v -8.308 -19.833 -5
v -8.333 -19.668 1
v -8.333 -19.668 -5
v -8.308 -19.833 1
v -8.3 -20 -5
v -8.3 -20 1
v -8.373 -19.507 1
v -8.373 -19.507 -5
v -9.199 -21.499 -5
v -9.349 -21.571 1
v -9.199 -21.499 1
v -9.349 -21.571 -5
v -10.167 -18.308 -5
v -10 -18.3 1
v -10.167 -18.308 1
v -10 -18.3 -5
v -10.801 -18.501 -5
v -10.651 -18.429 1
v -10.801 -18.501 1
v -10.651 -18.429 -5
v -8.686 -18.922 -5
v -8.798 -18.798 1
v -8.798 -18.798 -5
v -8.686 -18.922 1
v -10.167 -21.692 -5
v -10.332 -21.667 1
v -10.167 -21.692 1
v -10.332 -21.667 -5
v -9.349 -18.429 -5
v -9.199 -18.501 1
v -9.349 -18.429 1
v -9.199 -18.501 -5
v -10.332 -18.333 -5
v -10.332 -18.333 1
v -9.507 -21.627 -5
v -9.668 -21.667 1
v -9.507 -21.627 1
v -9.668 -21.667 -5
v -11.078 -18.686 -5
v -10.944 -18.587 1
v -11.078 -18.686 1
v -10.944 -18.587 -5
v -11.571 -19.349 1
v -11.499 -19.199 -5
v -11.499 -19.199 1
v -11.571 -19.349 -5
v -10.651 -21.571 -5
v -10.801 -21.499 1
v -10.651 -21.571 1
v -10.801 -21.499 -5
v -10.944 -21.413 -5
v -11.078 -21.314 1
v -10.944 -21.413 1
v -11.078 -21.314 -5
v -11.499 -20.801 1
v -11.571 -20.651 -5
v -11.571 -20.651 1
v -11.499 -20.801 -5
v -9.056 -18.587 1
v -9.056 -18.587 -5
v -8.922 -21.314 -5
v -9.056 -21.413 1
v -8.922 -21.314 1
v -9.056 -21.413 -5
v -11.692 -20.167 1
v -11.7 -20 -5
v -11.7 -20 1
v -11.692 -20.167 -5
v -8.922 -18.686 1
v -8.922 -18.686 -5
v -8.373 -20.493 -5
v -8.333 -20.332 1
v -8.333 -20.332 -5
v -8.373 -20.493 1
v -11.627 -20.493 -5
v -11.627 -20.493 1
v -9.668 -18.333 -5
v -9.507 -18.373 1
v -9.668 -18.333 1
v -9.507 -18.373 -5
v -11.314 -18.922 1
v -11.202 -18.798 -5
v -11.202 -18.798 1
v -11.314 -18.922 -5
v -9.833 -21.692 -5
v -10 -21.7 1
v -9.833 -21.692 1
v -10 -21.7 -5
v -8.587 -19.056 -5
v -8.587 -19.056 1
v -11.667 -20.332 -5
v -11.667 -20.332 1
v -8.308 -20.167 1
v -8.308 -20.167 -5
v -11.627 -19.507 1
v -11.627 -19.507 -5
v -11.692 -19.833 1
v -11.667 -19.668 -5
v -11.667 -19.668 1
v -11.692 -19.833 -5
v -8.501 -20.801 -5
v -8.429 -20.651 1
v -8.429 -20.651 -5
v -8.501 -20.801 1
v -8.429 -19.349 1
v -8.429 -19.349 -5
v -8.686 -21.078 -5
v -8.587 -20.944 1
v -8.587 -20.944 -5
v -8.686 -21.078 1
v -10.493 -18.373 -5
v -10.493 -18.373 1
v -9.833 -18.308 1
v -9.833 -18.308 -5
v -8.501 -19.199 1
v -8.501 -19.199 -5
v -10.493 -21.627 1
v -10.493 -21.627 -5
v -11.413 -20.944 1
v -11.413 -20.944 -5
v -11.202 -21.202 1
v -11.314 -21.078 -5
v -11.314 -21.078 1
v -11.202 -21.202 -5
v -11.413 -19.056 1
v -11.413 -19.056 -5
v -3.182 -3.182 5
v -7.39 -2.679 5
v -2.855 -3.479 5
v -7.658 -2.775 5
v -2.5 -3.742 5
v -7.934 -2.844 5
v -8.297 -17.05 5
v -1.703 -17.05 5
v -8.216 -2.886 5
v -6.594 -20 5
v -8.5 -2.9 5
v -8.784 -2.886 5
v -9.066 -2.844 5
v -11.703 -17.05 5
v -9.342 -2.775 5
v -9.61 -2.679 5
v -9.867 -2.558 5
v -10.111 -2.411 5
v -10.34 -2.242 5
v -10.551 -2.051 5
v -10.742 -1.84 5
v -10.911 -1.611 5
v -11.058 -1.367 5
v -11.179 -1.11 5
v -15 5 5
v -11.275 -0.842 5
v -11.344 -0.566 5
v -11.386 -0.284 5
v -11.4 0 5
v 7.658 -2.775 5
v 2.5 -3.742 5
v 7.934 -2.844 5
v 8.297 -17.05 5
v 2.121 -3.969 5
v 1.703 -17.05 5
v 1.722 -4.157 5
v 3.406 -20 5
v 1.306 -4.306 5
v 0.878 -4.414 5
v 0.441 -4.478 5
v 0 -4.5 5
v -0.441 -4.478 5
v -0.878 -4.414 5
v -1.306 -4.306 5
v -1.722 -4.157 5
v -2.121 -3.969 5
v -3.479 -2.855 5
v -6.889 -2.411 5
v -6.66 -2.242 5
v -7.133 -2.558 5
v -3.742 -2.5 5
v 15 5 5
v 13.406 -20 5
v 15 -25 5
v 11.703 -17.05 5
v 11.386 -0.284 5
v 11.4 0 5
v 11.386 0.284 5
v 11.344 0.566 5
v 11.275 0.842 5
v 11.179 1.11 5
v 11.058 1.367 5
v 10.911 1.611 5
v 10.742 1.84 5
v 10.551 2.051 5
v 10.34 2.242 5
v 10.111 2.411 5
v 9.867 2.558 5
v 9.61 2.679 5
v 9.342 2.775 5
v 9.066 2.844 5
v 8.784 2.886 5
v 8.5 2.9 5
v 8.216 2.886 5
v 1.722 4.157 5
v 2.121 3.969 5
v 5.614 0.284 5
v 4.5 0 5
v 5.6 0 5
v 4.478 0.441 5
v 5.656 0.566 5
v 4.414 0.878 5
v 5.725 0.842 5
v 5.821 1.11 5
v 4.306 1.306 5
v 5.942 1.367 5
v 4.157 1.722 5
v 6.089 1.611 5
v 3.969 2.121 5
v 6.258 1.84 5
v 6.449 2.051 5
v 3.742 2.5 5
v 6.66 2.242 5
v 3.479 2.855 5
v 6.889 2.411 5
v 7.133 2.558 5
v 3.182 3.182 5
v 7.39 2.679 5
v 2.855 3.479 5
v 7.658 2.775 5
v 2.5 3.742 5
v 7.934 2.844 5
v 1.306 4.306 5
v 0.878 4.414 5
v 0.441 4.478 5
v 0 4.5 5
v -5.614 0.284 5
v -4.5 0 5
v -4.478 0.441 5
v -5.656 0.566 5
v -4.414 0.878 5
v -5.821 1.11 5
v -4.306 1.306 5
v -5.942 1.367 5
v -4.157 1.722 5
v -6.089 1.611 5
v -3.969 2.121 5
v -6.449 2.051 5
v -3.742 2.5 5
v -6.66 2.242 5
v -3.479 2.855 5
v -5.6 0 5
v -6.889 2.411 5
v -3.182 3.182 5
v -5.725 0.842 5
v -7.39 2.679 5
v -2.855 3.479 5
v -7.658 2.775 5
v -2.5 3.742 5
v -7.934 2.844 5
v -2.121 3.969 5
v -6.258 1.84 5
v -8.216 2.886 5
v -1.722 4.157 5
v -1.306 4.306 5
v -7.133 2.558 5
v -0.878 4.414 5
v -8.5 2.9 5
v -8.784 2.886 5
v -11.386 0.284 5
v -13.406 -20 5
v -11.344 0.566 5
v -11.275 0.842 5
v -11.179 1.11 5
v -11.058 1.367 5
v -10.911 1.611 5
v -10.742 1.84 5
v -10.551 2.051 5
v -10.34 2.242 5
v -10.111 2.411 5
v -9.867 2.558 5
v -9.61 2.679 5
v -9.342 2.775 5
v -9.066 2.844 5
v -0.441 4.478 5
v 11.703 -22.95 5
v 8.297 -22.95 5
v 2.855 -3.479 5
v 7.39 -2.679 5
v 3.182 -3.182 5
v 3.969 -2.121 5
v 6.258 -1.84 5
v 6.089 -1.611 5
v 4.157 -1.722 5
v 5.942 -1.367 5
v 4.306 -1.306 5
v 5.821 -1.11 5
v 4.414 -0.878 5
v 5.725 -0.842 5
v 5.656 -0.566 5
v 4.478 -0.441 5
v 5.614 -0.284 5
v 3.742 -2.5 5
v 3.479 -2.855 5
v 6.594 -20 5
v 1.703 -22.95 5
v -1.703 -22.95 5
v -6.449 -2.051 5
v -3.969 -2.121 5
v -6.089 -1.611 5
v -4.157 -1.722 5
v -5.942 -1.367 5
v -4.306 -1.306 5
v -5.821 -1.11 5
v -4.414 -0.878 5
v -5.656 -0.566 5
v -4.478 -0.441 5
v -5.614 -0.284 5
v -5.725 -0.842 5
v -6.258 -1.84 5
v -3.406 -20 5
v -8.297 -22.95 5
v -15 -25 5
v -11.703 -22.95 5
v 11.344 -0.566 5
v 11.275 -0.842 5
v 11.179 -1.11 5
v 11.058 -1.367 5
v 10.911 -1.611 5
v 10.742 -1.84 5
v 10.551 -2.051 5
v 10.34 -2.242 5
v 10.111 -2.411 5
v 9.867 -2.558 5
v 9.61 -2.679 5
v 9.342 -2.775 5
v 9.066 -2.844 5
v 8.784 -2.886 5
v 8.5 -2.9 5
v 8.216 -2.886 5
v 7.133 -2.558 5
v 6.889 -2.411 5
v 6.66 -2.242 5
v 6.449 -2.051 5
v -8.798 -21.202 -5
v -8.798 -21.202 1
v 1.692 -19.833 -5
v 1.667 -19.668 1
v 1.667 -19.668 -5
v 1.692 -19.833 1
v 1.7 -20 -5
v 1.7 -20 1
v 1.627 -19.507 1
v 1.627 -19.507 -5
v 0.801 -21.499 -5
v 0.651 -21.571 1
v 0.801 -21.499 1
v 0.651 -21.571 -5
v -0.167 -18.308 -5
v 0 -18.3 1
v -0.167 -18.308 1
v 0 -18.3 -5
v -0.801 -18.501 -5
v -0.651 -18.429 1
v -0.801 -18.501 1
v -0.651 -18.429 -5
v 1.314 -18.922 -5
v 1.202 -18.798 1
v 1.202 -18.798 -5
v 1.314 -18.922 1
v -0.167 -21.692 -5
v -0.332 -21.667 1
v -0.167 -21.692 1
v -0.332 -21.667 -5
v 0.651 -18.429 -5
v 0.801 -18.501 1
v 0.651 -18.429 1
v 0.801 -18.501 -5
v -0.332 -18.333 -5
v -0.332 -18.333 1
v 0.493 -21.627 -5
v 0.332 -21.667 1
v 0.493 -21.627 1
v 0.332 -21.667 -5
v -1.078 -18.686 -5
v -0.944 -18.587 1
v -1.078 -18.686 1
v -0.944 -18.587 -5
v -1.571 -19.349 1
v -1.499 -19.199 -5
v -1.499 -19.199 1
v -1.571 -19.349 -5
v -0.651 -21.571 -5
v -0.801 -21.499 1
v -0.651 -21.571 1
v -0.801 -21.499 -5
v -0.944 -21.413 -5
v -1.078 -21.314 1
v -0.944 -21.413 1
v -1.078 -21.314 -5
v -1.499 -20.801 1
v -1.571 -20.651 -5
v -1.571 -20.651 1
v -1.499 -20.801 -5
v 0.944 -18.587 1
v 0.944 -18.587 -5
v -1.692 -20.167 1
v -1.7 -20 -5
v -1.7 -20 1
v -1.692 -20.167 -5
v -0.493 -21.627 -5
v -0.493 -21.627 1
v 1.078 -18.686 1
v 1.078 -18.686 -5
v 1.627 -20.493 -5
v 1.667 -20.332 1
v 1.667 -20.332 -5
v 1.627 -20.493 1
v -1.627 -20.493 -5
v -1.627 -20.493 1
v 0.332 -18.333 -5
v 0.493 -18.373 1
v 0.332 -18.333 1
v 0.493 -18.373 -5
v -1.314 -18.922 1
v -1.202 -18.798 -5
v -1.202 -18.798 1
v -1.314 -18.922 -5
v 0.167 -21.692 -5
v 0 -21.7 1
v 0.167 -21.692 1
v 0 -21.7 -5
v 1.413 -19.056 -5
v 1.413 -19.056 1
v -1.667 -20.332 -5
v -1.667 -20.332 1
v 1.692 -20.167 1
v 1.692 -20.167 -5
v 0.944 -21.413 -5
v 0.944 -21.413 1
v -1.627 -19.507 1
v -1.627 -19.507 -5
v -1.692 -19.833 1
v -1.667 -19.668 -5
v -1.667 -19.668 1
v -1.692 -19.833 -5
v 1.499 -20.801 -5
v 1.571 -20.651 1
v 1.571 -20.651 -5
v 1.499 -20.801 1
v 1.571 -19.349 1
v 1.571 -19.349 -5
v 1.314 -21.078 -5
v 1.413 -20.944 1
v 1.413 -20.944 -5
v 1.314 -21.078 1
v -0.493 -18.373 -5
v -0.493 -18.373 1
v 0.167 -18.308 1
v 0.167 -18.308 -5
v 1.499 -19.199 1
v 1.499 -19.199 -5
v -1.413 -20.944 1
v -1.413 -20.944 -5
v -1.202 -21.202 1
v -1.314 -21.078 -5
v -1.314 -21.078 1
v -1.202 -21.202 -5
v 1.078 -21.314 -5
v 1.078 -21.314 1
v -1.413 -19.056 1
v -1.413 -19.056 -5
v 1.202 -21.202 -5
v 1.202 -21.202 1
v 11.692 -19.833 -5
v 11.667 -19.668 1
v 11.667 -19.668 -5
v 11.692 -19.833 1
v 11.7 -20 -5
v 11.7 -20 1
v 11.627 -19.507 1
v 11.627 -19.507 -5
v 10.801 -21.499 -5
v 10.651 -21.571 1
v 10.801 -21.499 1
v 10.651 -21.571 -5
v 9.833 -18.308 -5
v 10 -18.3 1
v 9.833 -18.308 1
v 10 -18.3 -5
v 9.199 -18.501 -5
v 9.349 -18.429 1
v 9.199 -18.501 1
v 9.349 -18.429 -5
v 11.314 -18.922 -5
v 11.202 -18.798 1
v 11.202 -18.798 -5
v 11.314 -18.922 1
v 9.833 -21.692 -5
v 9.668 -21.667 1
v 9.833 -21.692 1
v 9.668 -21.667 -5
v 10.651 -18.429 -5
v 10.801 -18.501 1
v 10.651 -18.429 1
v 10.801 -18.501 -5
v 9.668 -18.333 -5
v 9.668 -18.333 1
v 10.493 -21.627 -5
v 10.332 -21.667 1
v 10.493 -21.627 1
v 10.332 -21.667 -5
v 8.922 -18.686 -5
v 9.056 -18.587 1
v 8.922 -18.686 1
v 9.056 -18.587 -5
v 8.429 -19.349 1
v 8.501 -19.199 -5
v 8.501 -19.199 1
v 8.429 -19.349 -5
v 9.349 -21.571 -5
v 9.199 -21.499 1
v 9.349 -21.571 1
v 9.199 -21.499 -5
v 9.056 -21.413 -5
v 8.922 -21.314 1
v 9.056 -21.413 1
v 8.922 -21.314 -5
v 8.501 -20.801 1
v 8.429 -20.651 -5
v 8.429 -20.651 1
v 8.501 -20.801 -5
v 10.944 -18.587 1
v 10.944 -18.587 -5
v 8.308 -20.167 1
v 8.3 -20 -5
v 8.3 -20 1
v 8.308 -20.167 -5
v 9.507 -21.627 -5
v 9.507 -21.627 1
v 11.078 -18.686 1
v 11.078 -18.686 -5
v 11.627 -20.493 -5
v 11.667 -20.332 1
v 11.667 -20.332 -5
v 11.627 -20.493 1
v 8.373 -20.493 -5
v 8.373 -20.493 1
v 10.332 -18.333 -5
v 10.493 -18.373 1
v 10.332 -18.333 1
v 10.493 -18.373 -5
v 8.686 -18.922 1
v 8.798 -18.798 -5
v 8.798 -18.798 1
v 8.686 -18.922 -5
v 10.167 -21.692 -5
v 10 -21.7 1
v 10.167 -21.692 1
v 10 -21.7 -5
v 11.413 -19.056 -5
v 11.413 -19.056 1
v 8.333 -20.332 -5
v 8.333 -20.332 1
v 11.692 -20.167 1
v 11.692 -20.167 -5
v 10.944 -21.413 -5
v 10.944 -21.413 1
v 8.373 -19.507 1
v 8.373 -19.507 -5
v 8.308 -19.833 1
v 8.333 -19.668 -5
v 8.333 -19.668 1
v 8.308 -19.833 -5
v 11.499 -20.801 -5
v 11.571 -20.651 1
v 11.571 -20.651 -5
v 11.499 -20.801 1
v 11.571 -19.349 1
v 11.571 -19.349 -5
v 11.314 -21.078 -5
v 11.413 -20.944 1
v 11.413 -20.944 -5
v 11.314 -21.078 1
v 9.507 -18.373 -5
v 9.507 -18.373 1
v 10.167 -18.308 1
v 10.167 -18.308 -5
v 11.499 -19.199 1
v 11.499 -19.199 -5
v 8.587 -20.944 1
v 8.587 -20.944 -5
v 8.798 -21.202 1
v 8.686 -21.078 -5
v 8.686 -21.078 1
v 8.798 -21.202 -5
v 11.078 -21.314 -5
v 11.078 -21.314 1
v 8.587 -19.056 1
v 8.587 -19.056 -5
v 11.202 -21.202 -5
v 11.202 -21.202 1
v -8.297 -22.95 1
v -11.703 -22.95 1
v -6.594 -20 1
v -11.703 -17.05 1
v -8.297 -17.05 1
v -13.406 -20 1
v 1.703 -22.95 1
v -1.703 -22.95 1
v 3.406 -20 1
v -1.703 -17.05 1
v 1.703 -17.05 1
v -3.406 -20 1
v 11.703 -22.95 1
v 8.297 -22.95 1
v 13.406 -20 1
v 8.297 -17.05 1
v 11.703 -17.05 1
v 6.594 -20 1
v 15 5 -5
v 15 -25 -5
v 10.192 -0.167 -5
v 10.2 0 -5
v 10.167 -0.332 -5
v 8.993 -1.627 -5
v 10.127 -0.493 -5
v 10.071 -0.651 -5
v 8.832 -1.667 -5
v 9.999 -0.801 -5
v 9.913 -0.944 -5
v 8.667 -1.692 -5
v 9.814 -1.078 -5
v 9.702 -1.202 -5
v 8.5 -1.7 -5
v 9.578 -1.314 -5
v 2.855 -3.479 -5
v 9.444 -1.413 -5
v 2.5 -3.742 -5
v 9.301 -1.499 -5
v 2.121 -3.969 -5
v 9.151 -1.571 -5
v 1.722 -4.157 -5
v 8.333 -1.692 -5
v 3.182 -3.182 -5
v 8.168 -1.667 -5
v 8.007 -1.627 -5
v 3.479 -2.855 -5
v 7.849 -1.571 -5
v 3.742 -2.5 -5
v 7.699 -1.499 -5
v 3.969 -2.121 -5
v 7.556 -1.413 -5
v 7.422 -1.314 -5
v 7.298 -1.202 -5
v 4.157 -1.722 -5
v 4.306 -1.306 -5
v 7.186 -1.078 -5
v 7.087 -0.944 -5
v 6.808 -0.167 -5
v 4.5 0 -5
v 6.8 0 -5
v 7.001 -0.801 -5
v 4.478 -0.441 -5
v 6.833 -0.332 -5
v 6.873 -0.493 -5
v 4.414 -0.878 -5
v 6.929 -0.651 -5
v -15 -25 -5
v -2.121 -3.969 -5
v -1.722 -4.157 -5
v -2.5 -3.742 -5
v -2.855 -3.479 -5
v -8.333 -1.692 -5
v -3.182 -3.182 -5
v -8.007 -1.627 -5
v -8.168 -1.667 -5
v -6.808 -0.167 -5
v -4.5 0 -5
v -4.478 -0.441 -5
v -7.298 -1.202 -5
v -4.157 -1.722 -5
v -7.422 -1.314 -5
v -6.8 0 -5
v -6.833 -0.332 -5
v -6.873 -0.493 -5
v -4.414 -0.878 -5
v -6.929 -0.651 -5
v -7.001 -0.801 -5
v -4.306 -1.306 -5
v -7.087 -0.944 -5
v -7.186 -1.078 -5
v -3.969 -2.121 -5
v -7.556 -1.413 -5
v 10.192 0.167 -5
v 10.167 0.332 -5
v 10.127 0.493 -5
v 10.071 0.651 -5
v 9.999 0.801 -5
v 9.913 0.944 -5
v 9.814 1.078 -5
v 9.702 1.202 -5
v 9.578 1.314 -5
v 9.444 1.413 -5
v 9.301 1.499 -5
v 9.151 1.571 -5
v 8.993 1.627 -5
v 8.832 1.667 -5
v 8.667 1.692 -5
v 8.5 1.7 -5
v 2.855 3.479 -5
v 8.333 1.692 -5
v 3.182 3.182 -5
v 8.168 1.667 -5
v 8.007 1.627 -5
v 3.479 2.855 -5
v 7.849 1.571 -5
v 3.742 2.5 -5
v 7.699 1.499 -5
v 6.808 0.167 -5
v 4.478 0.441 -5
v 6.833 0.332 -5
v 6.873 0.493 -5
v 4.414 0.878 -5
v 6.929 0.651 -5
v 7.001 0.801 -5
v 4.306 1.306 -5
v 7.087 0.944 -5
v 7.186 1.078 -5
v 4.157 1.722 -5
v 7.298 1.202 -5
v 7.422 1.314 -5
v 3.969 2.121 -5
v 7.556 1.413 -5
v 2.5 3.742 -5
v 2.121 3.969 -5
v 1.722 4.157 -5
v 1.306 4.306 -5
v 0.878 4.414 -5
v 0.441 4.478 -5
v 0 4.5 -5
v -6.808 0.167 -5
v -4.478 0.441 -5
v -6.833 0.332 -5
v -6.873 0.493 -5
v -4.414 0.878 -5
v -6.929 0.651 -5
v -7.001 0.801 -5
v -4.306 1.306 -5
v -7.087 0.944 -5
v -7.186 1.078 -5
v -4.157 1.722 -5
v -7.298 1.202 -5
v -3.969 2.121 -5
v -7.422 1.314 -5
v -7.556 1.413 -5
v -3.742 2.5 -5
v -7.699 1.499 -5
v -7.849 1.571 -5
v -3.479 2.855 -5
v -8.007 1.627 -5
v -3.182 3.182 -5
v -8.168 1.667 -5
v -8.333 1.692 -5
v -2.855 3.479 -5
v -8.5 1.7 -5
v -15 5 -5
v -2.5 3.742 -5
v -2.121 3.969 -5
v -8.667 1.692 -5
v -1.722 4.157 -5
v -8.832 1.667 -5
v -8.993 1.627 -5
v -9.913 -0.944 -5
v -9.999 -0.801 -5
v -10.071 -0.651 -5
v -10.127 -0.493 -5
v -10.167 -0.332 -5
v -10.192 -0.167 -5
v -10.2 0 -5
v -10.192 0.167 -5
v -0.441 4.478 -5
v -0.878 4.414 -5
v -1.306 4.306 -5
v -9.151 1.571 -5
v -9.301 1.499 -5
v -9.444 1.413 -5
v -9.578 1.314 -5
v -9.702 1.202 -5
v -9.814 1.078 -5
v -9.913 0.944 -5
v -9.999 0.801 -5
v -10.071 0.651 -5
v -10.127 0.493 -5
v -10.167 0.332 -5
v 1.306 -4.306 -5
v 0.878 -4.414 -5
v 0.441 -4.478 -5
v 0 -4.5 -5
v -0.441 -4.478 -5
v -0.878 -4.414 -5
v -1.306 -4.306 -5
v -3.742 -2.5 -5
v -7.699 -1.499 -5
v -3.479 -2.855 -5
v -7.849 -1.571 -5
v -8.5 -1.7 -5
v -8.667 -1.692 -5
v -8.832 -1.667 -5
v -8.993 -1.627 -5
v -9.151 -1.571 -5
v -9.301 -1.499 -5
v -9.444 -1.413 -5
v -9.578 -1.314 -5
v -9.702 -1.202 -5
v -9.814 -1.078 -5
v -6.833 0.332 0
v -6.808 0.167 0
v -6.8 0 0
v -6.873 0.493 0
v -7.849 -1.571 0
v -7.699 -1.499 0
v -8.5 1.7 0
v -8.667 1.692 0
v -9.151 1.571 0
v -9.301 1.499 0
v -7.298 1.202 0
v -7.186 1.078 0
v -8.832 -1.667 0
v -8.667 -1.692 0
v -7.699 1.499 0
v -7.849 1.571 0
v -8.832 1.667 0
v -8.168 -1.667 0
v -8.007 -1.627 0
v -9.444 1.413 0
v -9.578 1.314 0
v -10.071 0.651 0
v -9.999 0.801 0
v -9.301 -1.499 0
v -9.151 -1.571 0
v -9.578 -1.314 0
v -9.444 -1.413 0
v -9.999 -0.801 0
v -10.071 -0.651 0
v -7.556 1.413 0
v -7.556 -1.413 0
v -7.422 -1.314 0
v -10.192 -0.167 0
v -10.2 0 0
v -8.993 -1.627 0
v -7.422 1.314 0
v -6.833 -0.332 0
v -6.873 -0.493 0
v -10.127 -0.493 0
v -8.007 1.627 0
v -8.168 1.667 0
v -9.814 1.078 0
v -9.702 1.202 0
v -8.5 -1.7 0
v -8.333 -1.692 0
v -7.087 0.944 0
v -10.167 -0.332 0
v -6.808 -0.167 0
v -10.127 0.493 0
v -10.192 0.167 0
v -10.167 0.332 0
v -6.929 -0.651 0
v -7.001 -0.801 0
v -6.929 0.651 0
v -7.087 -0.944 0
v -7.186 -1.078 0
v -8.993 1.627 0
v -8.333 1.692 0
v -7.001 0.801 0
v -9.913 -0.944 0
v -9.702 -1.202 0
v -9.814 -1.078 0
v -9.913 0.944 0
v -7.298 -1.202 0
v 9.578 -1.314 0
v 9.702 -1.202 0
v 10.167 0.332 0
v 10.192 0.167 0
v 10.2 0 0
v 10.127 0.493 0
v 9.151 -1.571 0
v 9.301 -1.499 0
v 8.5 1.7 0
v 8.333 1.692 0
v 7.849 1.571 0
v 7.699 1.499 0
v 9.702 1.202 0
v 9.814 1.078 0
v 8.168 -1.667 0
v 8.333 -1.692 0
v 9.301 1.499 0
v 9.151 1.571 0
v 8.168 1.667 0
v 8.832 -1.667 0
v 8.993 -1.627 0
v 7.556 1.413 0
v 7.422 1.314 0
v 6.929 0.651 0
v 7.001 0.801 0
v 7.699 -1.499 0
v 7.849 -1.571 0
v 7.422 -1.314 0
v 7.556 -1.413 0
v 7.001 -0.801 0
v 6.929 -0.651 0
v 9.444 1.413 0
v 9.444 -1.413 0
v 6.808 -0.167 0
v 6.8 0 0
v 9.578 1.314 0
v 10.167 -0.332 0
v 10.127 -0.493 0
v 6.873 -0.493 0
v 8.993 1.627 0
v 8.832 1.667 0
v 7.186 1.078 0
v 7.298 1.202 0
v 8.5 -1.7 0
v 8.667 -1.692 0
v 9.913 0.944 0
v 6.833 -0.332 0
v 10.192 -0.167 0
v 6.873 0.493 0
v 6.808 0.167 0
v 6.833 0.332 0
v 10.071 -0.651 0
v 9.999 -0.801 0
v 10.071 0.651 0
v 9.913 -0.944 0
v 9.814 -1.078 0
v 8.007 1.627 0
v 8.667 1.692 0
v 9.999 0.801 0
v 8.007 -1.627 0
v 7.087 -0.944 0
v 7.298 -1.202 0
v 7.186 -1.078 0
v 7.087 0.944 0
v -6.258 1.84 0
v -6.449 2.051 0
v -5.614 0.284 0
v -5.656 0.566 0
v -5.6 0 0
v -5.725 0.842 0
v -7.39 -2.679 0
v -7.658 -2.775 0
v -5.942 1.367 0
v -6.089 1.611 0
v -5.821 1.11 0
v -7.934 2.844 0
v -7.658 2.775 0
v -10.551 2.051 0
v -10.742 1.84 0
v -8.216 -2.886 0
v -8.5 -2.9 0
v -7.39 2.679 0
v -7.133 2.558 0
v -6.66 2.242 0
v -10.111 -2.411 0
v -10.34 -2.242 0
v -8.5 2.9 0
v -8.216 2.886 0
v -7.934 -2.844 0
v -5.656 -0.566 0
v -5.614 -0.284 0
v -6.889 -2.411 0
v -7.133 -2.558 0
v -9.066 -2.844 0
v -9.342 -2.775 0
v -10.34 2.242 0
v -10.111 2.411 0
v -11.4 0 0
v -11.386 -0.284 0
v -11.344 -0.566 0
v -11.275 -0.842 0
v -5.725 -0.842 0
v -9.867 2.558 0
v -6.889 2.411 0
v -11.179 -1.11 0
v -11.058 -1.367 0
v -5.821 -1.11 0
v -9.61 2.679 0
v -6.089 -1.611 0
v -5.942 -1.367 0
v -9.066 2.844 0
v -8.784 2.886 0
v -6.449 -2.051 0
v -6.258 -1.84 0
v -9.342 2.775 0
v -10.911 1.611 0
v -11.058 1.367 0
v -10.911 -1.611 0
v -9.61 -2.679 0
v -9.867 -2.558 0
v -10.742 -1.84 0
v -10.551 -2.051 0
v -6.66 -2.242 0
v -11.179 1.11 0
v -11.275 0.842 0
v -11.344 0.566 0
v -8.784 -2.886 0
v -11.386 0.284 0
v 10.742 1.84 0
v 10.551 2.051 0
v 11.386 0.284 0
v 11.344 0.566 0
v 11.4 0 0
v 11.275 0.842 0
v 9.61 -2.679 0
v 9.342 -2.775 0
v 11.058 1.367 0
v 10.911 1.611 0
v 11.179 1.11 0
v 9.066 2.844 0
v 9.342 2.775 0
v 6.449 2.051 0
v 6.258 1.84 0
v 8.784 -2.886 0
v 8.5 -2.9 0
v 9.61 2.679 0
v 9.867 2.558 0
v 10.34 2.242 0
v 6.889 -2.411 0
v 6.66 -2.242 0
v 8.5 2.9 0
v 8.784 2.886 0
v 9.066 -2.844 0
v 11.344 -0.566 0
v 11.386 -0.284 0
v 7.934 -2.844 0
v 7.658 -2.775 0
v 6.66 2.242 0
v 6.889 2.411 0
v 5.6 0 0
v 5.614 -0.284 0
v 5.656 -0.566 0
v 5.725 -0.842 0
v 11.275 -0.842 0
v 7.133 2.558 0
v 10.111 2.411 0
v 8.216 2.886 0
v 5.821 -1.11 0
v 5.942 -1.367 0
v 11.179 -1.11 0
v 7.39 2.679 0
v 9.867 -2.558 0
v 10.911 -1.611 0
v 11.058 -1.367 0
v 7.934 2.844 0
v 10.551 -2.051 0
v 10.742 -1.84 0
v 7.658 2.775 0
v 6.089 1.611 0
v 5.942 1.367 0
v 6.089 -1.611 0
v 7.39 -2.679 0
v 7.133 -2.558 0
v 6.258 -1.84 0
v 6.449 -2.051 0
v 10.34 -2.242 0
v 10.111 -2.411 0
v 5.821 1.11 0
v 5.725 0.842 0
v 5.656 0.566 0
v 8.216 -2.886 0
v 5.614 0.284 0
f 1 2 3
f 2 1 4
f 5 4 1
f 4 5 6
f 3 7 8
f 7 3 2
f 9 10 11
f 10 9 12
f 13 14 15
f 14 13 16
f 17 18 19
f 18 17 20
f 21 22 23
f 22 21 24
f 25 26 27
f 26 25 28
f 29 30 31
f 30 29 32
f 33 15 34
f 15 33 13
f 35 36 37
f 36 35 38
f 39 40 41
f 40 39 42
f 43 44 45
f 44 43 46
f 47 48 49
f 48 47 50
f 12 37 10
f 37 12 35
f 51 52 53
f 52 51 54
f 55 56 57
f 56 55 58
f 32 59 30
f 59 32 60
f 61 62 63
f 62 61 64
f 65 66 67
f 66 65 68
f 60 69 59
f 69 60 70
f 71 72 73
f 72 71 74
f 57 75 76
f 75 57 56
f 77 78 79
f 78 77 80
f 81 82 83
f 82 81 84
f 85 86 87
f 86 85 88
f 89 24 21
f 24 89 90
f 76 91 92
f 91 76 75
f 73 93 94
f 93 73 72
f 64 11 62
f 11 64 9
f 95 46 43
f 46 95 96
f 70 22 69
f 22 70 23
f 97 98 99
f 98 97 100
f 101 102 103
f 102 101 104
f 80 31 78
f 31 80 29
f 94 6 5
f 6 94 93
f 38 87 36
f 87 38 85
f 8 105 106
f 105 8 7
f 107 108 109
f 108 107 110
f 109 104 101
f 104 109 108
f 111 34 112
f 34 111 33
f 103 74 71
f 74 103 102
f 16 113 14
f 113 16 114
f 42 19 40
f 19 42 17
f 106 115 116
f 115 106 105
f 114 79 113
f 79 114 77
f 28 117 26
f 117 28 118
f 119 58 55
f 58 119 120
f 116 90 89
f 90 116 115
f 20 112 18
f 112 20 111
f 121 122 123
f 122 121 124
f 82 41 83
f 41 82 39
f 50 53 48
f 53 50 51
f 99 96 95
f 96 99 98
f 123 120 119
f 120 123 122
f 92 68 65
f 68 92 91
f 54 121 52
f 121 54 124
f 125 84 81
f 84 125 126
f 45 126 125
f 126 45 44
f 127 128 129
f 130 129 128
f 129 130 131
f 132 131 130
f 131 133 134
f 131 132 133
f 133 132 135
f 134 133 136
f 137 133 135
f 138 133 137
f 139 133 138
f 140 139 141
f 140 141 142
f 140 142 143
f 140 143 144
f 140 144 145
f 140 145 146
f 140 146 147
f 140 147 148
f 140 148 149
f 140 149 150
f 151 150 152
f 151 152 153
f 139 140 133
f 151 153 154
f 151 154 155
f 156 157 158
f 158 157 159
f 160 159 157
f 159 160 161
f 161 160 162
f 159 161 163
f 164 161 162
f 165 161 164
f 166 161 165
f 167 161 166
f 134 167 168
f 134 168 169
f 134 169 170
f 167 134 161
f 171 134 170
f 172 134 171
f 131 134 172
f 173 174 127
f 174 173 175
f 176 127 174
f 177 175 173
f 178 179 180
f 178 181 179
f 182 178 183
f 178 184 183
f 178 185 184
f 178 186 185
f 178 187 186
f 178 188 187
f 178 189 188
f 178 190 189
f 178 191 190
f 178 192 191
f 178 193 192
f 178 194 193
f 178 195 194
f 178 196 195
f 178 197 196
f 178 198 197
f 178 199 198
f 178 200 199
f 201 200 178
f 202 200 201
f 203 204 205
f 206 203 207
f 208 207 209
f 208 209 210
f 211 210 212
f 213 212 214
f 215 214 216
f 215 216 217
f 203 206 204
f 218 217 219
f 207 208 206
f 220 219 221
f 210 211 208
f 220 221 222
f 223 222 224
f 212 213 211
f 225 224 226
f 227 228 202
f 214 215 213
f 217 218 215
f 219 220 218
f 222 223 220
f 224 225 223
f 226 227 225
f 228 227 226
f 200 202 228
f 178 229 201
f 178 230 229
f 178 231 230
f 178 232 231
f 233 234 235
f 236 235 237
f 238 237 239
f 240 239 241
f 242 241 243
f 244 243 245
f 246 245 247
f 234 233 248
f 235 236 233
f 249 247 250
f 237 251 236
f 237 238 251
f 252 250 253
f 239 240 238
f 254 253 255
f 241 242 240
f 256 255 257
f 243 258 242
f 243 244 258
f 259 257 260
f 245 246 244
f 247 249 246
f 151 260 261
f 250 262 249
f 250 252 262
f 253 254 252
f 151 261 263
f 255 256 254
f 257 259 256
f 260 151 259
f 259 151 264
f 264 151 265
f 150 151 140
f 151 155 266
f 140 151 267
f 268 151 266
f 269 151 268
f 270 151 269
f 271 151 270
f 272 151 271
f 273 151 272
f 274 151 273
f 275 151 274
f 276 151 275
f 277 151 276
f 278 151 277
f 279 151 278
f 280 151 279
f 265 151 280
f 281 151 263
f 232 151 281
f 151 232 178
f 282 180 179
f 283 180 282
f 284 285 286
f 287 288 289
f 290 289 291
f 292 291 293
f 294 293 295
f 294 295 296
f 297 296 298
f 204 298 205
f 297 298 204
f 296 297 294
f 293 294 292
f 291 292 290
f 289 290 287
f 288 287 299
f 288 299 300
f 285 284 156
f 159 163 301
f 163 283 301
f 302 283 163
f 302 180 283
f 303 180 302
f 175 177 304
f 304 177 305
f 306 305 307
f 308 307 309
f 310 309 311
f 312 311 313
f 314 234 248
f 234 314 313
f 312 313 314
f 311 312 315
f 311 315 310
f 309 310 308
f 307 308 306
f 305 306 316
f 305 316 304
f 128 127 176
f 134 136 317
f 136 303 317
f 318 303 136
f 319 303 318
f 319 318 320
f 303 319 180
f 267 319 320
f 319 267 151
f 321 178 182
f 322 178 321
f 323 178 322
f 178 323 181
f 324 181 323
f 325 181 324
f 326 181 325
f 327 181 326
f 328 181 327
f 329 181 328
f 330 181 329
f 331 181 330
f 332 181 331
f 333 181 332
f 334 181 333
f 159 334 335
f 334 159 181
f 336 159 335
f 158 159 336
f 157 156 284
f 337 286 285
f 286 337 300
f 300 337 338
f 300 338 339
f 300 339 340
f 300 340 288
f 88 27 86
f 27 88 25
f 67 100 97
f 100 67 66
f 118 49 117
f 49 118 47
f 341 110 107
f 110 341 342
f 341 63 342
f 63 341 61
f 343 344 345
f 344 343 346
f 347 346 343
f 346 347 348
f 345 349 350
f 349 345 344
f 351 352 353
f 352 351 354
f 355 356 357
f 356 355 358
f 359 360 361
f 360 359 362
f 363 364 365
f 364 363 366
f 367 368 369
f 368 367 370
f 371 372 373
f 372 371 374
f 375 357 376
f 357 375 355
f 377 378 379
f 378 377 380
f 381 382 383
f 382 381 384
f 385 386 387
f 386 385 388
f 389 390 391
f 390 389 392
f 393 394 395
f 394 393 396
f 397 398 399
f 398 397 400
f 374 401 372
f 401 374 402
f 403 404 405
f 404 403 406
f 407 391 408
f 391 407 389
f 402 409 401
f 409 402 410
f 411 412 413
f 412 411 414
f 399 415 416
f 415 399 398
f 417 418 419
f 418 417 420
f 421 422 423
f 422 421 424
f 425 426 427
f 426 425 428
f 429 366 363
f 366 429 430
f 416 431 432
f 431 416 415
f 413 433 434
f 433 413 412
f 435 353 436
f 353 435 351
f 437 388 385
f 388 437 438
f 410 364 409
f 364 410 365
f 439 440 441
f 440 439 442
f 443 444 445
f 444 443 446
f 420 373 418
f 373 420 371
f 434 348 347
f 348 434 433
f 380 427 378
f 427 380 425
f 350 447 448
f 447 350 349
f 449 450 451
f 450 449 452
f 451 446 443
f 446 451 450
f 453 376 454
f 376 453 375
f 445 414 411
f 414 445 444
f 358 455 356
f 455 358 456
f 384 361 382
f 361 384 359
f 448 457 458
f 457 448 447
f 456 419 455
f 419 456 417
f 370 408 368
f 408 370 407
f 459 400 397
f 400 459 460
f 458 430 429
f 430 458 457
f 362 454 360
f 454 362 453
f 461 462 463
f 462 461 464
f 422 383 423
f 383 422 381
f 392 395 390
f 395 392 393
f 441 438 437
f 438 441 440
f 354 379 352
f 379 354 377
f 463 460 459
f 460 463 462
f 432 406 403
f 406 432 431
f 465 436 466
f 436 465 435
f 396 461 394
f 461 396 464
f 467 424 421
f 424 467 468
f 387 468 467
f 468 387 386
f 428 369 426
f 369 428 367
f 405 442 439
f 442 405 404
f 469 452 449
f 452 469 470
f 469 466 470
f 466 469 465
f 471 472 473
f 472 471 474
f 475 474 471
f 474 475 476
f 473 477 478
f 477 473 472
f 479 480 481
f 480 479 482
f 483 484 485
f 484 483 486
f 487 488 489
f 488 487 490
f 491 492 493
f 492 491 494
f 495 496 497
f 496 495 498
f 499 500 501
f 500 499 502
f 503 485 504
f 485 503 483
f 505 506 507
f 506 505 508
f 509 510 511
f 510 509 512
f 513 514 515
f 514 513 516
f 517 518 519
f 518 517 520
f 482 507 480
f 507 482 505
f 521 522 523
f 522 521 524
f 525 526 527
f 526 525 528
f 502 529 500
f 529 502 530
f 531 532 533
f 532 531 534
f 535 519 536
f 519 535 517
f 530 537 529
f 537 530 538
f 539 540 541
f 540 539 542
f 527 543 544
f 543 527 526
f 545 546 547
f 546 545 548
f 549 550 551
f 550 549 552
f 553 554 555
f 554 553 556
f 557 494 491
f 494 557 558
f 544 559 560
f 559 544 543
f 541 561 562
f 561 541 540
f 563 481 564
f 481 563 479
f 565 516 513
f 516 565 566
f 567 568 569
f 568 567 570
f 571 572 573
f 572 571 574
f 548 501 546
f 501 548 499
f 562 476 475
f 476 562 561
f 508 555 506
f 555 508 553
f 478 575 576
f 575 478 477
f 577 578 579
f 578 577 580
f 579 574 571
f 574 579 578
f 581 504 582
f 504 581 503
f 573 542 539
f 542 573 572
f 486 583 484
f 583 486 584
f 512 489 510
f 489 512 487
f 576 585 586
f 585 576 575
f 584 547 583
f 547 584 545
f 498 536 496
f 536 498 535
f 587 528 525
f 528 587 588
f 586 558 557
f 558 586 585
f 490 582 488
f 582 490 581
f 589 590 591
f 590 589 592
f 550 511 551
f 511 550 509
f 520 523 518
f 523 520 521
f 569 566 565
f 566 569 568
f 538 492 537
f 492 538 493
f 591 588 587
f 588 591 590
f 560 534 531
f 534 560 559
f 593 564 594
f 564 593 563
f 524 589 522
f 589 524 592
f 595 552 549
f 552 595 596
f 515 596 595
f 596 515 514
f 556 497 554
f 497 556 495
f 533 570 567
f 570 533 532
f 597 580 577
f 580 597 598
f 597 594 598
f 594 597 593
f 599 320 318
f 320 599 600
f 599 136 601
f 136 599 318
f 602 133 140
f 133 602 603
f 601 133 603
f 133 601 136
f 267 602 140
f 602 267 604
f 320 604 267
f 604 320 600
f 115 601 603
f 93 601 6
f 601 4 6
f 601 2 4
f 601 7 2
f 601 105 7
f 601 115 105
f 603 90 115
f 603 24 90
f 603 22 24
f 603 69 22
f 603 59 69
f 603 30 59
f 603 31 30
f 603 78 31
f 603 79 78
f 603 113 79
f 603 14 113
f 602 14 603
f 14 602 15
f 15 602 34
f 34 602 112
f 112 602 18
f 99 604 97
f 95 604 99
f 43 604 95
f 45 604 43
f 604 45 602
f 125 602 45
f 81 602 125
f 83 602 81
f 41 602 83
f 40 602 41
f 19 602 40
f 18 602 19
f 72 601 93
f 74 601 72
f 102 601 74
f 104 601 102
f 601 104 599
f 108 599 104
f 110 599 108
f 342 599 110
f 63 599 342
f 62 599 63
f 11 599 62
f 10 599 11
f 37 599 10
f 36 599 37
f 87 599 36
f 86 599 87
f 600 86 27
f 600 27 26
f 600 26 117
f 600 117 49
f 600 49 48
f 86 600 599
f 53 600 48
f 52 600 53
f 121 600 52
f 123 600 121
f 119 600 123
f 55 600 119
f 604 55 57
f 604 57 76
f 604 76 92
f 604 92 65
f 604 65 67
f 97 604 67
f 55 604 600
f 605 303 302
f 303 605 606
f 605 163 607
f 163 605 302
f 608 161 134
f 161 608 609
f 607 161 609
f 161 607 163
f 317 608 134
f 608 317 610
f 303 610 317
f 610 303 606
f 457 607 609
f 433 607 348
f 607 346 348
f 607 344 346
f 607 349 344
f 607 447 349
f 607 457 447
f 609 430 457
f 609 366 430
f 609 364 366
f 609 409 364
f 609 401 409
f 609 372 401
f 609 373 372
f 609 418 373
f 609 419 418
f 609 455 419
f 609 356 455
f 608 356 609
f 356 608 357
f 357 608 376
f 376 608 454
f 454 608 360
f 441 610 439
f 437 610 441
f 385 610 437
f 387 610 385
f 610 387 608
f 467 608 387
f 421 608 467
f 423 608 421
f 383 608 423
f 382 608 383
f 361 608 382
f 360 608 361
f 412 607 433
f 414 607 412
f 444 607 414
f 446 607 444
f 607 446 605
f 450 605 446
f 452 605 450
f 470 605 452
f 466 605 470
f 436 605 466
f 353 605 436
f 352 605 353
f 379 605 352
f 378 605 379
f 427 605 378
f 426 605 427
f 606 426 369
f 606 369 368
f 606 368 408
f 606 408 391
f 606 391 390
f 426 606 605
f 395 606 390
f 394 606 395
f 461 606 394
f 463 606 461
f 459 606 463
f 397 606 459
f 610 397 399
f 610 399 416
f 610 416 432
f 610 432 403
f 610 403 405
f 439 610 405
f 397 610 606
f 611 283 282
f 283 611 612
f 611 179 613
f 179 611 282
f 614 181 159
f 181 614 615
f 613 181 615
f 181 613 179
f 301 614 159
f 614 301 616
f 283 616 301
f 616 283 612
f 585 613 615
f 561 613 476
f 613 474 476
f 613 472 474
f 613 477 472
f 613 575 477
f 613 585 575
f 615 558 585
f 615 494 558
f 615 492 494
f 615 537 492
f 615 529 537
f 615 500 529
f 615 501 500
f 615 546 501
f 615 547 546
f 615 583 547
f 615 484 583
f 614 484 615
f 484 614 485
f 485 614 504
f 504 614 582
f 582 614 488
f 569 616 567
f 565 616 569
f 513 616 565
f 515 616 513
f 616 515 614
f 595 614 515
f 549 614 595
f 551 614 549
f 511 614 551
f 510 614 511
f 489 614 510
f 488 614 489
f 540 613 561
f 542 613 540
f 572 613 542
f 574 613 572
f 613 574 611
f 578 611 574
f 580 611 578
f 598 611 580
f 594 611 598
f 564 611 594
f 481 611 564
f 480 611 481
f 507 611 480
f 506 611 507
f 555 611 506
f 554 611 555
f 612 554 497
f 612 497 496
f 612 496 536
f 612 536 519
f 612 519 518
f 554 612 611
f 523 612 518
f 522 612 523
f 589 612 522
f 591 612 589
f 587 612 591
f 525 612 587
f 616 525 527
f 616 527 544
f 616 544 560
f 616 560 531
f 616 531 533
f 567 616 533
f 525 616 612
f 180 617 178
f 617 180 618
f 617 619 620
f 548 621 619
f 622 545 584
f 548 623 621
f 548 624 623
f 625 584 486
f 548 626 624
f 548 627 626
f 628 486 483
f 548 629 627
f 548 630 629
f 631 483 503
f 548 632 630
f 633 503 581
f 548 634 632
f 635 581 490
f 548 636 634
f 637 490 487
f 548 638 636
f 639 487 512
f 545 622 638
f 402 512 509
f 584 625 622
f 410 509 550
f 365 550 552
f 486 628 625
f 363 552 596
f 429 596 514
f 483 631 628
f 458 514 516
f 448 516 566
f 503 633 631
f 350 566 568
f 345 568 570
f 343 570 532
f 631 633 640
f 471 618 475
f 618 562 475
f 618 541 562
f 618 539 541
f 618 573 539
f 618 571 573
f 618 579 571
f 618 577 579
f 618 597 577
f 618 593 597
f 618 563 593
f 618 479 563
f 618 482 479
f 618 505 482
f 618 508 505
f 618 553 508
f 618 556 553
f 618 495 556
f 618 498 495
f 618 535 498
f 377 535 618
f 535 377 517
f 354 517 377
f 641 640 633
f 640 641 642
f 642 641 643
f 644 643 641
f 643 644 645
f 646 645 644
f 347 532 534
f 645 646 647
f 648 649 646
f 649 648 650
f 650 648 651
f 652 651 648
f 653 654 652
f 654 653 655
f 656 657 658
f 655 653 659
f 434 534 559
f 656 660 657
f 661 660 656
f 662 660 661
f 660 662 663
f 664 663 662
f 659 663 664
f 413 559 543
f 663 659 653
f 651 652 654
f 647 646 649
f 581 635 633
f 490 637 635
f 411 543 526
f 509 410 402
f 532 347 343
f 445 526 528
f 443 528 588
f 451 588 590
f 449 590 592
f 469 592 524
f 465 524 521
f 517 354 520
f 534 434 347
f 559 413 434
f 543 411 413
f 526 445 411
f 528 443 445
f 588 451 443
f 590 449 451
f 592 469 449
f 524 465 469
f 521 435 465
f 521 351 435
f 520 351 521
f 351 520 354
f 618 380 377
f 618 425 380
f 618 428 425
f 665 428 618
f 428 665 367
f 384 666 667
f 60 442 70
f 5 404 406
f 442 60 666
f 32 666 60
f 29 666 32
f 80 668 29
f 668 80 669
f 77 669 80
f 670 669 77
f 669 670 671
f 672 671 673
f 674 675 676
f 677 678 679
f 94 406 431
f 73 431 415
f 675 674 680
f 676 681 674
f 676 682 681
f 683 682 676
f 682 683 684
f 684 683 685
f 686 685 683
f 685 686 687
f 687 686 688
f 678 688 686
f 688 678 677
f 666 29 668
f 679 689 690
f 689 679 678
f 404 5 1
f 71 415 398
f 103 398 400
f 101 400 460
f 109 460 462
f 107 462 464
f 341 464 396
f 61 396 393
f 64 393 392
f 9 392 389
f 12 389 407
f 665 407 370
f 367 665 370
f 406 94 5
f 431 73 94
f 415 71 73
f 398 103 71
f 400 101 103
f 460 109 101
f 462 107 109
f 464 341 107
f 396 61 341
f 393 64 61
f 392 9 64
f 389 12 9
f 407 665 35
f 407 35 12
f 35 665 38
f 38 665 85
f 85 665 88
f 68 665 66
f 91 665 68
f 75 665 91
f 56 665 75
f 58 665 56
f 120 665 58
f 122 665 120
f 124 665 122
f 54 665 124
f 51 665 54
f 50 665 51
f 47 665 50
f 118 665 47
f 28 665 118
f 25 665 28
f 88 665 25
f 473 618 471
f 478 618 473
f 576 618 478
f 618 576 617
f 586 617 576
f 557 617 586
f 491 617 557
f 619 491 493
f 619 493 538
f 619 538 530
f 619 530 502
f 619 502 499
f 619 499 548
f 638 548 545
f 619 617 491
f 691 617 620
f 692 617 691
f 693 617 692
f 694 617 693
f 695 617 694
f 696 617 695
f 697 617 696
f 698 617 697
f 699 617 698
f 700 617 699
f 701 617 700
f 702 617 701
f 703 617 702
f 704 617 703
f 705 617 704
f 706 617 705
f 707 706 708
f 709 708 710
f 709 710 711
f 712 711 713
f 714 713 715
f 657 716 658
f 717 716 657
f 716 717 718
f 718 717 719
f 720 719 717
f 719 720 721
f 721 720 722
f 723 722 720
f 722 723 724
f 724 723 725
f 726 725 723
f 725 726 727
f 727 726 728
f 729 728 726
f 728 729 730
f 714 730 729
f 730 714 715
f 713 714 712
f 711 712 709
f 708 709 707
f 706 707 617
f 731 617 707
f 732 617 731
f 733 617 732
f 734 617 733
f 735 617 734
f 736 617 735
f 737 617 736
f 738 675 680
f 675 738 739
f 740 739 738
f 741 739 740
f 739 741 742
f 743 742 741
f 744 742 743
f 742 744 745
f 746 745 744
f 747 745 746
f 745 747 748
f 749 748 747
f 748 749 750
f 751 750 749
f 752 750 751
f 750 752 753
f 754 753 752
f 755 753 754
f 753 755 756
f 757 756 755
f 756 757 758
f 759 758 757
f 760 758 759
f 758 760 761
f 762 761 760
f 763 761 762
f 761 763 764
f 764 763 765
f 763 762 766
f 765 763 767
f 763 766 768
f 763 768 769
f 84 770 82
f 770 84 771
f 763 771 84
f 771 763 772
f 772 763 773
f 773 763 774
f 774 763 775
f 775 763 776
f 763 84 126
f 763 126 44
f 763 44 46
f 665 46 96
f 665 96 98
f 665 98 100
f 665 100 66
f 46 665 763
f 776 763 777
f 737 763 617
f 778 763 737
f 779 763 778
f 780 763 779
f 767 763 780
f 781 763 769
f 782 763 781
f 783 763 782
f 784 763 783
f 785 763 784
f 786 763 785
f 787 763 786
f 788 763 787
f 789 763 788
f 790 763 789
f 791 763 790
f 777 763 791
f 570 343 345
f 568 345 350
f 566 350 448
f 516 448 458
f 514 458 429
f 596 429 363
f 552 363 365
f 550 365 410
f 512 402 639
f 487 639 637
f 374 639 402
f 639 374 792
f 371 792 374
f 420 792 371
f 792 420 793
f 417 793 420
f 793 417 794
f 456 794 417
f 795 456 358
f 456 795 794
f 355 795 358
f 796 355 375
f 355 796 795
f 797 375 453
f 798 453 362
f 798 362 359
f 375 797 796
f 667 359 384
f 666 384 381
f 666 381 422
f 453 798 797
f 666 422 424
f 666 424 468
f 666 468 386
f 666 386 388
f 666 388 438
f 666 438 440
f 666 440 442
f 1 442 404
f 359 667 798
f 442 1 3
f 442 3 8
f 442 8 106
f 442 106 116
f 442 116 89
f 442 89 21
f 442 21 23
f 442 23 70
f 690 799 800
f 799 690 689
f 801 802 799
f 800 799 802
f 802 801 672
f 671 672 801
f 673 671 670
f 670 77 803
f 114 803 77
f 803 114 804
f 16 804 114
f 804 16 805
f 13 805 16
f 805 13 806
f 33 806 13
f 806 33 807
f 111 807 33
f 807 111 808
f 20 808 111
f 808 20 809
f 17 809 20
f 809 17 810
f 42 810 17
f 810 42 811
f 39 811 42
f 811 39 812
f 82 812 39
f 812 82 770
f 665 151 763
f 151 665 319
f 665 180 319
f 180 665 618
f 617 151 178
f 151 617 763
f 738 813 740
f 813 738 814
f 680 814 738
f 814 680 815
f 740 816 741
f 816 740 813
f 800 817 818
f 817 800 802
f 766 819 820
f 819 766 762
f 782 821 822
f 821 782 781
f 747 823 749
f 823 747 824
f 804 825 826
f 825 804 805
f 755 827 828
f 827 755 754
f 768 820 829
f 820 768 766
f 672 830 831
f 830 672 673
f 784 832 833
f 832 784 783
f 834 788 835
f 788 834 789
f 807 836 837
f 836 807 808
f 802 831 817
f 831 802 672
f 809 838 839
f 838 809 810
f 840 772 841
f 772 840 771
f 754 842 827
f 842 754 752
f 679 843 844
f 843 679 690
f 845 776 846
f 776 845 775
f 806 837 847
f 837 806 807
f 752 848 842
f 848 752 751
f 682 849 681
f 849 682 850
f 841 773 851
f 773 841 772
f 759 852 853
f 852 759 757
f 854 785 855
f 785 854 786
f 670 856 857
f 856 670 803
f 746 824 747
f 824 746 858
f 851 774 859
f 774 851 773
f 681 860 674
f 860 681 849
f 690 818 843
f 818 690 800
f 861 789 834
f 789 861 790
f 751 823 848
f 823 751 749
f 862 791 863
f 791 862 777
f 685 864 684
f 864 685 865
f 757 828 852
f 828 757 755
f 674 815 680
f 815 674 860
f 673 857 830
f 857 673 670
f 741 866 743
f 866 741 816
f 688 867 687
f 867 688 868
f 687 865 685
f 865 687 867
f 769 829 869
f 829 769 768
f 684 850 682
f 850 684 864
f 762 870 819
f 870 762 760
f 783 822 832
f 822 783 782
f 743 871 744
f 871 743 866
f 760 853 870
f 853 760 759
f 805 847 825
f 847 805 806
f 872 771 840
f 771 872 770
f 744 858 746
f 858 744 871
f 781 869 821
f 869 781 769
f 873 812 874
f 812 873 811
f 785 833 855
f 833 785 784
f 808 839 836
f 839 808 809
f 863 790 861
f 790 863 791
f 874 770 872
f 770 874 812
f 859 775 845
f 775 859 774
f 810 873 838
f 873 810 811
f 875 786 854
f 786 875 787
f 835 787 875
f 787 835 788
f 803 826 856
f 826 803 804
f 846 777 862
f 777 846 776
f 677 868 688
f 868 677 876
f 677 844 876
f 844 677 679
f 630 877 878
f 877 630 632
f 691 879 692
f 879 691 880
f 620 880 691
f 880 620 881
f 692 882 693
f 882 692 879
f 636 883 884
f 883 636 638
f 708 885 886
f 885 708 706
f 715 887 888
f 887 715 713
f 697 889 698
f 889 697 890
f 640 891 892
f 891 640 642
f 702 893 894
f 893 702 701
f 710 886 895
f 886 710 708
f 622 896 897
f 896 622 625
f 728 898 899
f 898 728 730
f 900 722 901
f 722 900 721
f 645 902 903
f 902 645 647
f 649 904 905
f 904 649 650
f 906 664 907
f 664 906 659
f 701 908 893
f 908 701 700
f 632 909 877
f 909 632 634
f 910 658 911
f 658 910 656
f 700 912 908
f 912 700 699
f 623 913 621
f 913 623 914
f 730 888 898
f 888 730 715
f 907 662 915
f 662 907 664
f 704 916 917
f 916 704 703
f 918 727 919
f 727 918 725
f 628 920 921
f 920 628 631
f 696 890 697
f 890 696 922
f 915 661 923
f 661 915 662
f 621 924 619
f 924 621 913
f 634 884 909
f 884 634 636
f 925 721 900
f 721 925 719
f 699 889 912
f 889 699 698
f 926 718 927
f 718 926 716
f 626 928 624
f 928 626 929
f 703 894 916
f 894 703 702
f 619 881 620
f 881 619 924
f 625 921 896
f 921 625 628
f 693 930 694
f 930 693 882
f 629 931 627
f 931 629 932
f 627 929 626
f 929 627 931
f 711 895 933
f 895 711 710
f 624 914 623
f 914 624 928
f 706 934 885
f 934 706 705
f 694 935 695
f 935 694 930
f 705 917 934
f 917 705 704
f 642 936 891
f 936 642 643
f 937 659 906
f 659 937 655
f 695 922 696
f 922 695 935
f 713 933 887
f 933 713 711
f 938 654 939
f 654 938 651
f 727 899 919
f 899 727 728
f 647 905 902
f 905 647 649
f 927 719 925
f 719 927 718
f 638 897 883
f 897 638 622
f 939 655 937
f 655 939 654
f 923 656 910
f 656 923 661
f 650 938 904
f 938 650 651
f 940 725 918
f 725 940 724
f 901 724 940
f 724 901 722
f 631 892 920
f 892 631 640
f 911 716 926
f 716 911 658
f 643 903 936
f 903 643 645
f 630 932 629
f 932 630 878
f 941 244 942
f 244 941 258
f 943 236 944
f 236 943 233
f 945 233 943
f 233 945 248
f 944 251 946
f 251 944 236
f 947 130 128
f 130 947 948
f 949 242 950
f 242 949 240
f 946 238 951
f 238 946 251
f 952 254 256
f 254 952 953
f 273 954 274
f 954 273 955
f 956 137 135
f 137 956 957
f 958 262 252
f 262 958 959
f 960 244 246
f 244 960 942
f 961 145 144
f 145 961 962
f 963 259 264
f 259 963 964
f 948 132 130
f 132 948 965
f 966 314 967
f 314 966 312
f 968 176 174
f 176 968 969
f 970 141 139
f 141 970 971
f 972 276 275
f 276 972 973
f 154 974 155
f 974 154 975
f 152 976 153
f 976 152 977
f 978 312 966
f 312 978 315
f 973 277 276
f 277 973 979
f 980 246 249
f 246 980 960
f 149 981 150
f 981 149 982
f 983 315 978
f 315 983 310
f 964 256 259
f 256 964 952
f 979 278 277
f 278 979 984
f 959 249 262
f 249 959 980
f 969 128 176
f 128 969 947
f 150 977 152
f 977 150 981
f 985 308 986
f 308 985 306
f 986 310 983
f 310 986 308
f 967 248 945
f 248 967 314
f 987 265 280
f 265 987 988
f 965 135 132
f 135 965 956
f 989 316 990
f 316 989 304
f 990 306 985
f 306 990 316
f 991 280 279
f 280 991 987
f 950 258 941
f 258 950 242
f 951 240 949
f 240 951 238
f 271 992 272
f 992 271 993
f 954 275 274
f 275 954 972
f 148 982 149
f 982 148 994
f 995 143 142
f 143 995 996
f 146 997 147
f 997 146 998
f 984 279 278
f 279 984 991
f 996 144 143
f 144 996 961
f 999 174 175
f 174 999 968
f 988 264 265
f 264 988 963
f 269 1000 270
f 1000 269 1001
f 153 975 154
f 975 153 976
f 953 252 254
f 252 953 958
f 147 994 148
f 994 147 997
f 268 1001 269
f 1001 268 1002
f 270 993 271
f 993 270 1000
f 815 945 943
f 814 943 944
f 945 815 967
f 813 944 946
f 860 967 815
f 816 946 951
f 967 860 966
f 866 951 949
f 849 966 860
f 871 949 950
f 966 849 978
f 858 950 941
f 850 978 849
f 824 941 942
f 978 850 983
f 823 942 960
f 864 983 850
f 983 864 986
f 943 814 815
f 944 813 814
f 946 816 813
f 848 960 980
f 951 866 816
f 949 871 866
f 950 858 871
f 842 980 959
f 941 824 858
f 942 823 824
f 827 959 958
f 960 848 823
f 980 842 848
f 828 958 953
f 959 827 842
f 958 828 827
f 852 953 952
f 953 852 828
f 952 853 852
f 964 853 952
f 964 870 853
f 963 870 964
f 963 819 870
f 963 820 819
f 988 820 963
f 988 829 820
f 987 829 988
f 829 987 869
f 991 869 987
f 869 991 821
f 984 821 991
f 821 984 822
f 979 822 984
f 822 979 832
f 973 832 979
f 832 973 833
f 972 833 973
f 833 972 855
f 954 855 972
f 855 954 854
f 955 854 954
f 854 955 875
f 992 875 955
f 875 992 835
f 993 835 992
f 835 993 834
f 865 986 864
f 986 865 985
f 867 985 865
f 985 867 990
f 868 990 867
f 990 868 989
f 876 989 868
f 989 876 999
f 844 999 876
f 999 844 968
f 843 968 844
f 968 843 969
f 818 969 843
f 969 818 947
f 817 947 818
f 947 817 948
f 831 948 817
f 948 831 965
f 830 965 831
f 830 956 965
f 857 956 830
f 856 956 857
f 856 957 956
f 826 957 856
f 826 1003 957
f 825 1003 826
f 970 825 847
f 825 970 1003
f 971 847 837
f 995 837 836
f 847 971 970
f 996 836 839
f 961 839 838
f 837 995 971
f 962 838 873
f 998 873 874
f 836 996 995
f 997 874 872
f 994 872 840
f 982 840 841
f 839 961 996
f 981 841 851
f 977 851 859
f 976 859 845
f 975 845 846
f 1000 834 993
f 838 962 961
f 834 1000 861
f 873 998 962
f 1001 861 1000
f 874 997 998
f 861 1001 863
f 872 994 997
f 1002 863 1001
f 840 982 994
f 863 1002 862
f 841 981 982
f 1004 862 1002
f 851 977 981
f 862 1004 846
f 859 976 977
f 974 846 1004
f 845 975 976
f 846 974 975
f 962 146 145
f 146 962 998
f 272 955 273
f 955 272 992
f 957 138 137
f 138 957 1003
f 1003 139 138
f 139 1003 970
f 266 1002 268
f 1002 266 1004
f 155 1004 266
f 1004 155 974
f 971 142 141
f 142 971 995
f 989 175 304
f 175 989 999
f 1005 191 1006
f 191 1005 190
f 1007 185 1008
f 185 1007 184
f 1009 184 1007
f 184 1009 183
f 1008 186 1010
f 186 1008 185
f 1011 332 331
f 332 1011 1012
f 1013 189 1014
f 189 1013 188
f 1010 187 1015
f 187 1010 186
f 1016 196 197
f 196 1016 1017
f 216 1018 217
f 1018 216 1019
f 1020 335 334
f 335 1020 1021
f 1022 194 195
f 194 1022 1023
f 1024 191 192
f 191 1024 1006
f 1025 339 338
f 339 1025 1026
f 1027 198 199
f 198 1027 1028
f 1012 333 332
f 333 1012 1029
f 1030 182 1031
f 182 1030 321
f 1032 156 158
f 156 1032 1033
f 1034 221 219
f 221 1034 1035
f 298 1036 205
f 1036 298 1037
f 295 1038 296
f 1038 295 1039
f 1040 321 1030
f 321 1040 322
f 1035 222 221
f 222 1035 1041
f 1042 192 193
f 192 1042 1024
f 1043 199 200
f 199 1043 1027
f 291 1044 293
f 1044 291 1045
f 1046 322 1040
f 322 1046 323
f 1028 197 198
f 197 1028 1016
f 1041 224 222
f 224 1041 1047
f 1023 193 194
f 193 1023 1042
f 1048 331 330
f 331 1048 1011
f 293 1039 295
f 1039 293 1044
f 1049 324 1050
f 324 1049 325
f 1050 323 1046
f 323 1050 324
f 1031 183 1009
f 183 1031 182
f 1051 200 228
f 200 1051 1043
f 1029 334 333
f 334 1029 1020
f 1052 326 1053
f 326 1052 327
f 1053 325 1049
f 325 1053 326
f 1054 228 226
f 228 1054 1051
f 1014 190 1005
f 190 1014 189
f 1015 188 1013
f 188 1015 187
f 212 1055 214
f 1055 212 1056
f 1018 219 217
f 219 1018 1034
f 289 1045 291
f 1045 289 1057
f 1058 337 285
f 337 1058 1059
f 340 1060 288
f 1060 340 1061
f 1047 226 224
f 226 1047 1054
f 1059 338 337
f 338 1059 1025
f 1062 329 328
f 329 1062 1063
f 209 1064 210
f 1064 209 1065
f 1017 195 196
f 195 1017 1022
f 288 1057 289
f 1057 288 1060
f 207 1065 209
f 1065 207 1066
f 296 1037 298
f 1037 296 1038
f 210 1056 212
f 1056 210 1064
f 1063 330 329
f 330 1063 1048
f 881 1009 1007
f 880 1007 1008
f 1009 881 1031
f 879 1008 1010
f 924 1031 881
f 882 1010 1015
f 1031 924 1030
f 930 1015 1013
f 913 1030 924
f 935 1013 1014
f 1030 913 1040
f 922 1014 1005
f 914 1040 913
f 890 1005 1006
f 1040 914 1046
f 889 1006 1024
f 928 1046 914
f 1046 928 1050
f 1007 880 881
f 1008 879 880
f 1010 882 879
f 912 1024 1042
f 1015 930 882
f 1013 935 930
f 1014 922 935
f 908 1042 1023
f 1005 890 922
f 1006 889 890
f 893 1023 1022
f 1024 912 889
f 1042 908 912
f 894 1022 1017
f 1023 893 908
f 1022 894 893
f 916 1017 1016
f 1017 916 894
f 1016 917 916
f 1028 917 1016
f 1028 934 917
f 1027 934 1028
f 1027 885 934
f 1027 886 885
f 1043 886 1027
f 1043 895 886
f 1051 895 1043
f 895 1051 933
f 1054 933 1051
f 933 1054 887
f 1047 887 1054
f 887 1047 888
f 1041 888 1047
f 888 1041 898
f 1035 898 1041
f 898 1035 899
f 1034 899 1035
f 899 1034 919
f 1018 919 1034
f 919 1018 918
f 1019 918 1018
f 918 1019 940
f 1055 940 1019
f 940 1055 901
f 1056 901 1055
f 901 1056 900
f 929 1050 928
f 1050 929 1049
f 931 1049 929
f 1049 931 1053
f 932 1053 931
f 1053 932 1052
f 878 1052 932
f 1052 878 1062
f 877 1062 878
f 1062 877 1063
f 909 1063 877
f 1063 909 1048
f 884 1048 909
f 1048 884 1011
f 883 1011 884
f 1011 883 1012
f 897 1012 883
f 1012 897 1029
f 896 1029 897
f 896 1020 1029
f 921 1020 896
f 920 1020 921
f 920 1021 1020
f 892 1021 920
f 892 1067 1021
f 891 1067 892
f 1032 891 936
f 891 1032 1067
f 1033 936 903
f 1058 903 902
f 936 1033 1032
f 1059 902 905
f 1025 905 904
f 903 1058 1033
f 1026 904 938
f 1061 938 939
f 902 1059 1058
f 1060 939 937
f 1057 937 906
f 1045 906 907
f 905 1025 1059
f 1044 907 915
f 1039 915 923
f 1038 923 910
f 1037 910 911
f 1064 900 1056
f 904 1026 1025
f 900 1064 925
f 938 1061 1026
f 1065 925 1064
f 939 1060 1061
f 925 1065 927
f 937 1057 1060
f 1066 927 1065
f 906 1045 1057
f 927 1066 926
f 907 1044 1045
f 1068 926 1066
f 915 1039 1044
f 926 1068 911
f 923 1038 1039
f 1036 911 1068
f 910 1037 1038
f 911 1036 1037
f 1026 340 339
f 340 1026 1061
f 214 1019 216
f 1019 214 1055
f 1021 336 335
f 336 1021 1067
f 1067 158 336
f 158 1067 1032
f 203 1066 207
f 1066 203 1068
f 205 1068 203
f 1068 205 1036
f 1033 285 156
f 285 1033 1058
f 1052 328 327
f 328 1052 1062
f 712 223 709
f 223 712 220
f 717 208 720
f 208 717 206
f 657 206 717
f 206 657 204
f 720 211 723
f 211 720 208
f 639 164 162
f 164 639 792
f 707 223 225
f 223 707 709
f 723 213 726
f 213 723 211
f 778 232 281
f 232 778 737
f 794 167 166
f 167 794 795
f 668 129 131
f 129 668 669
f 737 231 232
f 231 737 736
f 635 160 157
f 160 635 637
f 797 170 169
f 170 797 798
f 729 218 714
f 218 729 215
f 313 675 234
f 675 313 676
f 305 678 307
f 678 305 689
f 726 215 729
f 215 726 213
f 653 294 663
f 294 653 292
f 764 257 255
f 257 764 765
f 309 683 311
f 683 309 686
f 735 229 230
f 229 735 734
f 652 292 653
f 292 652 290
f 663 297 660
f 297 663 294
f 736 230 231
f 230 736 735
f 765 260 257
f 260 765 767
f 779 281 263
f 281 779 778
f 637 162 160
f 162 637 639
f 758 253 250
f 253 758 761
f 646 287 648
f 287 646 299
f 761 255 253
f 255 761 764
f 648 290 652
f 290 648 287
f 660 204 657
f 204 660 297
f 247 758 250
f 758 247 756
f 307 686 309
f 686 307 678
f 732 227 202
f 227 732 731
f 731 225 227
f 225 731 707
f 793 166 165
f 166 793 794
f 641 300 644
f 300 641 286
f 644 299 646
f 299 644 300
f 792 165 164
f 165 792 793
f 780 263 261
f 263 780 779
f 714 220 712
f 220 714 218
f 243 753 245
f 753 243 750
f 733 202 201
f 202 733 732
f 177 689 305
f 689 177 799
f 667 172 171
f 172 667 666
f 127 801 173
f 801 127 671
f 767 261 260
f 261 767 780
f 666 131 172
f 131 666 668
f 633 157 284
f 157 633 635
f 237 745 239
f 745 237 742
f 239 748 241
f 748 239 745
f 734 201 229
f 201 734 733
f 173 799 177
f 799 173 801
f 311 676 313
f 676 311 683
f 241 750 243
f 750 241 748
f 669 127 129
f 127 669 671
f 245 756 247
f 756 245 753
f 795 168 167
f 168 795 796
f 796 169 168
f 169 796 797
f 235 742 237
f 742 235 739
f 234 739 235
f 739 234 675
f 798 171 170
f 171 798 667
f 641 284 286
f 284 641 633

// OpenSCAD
difference() {
sidex=30;
sidey=50;
height=10;
cylinder_small=3.4;
cylinder_big=2*(5.5+0.4) / sqrt(3);
screw_head_height=1 ;
edges=6;
screw_head_m3 = 5.8;
    //Base Foot
cube([sidex,sidey,height], center=true);    
   
      //Difference Long Cube
translate([-16,5,-5.1])
    cube([31.2,20.2,10.2]);
    
    //Small Holes
    for(x=[-10:10:10]){    
translate([x,-20,-5])
   cylinder(d=cylinder_small, h=20,$fn=64,center=true);
translate([x,20,-5])    
   cylinder(d=cylinder_small, h=20,$fn=64,center=true);   
  }
    //Big Holes
    for(x=[-10:10:10]){   
translate([x,-20,screw_head_height])
   cylinder(d=cylinder_big, h=20,$fn=edges);    
translate([x,20,screw_head_height])
   cylinder(d=cylinder_big, h=20,$fn=edges);       
  }
  
  //Motor Hole 1
translate([-8.5,0,0])
   cylinder(d=cylinder_small, h=20,$fn=64,center=true);
  //Motor Hole 2
translate([8.5,0,0])
   cylinder(d=cylinder_small, h=20,$fn=64,center=true);
  //Motor Big Hole 1
translate([-8.5,0,0])
   cylinder(d=screw_head_m3, h=20,$fn=64);
  //Motor Big Hole 1  
translate([8.5,0,0])
   cylinder(d=screw_head_m3, h=20,$fn=64); 
  
  //Motor Center Hole
translate([0,0,-10])
    cylinder(d=9.0, h=20, $fn=64);
  
  
      
  
   
}
